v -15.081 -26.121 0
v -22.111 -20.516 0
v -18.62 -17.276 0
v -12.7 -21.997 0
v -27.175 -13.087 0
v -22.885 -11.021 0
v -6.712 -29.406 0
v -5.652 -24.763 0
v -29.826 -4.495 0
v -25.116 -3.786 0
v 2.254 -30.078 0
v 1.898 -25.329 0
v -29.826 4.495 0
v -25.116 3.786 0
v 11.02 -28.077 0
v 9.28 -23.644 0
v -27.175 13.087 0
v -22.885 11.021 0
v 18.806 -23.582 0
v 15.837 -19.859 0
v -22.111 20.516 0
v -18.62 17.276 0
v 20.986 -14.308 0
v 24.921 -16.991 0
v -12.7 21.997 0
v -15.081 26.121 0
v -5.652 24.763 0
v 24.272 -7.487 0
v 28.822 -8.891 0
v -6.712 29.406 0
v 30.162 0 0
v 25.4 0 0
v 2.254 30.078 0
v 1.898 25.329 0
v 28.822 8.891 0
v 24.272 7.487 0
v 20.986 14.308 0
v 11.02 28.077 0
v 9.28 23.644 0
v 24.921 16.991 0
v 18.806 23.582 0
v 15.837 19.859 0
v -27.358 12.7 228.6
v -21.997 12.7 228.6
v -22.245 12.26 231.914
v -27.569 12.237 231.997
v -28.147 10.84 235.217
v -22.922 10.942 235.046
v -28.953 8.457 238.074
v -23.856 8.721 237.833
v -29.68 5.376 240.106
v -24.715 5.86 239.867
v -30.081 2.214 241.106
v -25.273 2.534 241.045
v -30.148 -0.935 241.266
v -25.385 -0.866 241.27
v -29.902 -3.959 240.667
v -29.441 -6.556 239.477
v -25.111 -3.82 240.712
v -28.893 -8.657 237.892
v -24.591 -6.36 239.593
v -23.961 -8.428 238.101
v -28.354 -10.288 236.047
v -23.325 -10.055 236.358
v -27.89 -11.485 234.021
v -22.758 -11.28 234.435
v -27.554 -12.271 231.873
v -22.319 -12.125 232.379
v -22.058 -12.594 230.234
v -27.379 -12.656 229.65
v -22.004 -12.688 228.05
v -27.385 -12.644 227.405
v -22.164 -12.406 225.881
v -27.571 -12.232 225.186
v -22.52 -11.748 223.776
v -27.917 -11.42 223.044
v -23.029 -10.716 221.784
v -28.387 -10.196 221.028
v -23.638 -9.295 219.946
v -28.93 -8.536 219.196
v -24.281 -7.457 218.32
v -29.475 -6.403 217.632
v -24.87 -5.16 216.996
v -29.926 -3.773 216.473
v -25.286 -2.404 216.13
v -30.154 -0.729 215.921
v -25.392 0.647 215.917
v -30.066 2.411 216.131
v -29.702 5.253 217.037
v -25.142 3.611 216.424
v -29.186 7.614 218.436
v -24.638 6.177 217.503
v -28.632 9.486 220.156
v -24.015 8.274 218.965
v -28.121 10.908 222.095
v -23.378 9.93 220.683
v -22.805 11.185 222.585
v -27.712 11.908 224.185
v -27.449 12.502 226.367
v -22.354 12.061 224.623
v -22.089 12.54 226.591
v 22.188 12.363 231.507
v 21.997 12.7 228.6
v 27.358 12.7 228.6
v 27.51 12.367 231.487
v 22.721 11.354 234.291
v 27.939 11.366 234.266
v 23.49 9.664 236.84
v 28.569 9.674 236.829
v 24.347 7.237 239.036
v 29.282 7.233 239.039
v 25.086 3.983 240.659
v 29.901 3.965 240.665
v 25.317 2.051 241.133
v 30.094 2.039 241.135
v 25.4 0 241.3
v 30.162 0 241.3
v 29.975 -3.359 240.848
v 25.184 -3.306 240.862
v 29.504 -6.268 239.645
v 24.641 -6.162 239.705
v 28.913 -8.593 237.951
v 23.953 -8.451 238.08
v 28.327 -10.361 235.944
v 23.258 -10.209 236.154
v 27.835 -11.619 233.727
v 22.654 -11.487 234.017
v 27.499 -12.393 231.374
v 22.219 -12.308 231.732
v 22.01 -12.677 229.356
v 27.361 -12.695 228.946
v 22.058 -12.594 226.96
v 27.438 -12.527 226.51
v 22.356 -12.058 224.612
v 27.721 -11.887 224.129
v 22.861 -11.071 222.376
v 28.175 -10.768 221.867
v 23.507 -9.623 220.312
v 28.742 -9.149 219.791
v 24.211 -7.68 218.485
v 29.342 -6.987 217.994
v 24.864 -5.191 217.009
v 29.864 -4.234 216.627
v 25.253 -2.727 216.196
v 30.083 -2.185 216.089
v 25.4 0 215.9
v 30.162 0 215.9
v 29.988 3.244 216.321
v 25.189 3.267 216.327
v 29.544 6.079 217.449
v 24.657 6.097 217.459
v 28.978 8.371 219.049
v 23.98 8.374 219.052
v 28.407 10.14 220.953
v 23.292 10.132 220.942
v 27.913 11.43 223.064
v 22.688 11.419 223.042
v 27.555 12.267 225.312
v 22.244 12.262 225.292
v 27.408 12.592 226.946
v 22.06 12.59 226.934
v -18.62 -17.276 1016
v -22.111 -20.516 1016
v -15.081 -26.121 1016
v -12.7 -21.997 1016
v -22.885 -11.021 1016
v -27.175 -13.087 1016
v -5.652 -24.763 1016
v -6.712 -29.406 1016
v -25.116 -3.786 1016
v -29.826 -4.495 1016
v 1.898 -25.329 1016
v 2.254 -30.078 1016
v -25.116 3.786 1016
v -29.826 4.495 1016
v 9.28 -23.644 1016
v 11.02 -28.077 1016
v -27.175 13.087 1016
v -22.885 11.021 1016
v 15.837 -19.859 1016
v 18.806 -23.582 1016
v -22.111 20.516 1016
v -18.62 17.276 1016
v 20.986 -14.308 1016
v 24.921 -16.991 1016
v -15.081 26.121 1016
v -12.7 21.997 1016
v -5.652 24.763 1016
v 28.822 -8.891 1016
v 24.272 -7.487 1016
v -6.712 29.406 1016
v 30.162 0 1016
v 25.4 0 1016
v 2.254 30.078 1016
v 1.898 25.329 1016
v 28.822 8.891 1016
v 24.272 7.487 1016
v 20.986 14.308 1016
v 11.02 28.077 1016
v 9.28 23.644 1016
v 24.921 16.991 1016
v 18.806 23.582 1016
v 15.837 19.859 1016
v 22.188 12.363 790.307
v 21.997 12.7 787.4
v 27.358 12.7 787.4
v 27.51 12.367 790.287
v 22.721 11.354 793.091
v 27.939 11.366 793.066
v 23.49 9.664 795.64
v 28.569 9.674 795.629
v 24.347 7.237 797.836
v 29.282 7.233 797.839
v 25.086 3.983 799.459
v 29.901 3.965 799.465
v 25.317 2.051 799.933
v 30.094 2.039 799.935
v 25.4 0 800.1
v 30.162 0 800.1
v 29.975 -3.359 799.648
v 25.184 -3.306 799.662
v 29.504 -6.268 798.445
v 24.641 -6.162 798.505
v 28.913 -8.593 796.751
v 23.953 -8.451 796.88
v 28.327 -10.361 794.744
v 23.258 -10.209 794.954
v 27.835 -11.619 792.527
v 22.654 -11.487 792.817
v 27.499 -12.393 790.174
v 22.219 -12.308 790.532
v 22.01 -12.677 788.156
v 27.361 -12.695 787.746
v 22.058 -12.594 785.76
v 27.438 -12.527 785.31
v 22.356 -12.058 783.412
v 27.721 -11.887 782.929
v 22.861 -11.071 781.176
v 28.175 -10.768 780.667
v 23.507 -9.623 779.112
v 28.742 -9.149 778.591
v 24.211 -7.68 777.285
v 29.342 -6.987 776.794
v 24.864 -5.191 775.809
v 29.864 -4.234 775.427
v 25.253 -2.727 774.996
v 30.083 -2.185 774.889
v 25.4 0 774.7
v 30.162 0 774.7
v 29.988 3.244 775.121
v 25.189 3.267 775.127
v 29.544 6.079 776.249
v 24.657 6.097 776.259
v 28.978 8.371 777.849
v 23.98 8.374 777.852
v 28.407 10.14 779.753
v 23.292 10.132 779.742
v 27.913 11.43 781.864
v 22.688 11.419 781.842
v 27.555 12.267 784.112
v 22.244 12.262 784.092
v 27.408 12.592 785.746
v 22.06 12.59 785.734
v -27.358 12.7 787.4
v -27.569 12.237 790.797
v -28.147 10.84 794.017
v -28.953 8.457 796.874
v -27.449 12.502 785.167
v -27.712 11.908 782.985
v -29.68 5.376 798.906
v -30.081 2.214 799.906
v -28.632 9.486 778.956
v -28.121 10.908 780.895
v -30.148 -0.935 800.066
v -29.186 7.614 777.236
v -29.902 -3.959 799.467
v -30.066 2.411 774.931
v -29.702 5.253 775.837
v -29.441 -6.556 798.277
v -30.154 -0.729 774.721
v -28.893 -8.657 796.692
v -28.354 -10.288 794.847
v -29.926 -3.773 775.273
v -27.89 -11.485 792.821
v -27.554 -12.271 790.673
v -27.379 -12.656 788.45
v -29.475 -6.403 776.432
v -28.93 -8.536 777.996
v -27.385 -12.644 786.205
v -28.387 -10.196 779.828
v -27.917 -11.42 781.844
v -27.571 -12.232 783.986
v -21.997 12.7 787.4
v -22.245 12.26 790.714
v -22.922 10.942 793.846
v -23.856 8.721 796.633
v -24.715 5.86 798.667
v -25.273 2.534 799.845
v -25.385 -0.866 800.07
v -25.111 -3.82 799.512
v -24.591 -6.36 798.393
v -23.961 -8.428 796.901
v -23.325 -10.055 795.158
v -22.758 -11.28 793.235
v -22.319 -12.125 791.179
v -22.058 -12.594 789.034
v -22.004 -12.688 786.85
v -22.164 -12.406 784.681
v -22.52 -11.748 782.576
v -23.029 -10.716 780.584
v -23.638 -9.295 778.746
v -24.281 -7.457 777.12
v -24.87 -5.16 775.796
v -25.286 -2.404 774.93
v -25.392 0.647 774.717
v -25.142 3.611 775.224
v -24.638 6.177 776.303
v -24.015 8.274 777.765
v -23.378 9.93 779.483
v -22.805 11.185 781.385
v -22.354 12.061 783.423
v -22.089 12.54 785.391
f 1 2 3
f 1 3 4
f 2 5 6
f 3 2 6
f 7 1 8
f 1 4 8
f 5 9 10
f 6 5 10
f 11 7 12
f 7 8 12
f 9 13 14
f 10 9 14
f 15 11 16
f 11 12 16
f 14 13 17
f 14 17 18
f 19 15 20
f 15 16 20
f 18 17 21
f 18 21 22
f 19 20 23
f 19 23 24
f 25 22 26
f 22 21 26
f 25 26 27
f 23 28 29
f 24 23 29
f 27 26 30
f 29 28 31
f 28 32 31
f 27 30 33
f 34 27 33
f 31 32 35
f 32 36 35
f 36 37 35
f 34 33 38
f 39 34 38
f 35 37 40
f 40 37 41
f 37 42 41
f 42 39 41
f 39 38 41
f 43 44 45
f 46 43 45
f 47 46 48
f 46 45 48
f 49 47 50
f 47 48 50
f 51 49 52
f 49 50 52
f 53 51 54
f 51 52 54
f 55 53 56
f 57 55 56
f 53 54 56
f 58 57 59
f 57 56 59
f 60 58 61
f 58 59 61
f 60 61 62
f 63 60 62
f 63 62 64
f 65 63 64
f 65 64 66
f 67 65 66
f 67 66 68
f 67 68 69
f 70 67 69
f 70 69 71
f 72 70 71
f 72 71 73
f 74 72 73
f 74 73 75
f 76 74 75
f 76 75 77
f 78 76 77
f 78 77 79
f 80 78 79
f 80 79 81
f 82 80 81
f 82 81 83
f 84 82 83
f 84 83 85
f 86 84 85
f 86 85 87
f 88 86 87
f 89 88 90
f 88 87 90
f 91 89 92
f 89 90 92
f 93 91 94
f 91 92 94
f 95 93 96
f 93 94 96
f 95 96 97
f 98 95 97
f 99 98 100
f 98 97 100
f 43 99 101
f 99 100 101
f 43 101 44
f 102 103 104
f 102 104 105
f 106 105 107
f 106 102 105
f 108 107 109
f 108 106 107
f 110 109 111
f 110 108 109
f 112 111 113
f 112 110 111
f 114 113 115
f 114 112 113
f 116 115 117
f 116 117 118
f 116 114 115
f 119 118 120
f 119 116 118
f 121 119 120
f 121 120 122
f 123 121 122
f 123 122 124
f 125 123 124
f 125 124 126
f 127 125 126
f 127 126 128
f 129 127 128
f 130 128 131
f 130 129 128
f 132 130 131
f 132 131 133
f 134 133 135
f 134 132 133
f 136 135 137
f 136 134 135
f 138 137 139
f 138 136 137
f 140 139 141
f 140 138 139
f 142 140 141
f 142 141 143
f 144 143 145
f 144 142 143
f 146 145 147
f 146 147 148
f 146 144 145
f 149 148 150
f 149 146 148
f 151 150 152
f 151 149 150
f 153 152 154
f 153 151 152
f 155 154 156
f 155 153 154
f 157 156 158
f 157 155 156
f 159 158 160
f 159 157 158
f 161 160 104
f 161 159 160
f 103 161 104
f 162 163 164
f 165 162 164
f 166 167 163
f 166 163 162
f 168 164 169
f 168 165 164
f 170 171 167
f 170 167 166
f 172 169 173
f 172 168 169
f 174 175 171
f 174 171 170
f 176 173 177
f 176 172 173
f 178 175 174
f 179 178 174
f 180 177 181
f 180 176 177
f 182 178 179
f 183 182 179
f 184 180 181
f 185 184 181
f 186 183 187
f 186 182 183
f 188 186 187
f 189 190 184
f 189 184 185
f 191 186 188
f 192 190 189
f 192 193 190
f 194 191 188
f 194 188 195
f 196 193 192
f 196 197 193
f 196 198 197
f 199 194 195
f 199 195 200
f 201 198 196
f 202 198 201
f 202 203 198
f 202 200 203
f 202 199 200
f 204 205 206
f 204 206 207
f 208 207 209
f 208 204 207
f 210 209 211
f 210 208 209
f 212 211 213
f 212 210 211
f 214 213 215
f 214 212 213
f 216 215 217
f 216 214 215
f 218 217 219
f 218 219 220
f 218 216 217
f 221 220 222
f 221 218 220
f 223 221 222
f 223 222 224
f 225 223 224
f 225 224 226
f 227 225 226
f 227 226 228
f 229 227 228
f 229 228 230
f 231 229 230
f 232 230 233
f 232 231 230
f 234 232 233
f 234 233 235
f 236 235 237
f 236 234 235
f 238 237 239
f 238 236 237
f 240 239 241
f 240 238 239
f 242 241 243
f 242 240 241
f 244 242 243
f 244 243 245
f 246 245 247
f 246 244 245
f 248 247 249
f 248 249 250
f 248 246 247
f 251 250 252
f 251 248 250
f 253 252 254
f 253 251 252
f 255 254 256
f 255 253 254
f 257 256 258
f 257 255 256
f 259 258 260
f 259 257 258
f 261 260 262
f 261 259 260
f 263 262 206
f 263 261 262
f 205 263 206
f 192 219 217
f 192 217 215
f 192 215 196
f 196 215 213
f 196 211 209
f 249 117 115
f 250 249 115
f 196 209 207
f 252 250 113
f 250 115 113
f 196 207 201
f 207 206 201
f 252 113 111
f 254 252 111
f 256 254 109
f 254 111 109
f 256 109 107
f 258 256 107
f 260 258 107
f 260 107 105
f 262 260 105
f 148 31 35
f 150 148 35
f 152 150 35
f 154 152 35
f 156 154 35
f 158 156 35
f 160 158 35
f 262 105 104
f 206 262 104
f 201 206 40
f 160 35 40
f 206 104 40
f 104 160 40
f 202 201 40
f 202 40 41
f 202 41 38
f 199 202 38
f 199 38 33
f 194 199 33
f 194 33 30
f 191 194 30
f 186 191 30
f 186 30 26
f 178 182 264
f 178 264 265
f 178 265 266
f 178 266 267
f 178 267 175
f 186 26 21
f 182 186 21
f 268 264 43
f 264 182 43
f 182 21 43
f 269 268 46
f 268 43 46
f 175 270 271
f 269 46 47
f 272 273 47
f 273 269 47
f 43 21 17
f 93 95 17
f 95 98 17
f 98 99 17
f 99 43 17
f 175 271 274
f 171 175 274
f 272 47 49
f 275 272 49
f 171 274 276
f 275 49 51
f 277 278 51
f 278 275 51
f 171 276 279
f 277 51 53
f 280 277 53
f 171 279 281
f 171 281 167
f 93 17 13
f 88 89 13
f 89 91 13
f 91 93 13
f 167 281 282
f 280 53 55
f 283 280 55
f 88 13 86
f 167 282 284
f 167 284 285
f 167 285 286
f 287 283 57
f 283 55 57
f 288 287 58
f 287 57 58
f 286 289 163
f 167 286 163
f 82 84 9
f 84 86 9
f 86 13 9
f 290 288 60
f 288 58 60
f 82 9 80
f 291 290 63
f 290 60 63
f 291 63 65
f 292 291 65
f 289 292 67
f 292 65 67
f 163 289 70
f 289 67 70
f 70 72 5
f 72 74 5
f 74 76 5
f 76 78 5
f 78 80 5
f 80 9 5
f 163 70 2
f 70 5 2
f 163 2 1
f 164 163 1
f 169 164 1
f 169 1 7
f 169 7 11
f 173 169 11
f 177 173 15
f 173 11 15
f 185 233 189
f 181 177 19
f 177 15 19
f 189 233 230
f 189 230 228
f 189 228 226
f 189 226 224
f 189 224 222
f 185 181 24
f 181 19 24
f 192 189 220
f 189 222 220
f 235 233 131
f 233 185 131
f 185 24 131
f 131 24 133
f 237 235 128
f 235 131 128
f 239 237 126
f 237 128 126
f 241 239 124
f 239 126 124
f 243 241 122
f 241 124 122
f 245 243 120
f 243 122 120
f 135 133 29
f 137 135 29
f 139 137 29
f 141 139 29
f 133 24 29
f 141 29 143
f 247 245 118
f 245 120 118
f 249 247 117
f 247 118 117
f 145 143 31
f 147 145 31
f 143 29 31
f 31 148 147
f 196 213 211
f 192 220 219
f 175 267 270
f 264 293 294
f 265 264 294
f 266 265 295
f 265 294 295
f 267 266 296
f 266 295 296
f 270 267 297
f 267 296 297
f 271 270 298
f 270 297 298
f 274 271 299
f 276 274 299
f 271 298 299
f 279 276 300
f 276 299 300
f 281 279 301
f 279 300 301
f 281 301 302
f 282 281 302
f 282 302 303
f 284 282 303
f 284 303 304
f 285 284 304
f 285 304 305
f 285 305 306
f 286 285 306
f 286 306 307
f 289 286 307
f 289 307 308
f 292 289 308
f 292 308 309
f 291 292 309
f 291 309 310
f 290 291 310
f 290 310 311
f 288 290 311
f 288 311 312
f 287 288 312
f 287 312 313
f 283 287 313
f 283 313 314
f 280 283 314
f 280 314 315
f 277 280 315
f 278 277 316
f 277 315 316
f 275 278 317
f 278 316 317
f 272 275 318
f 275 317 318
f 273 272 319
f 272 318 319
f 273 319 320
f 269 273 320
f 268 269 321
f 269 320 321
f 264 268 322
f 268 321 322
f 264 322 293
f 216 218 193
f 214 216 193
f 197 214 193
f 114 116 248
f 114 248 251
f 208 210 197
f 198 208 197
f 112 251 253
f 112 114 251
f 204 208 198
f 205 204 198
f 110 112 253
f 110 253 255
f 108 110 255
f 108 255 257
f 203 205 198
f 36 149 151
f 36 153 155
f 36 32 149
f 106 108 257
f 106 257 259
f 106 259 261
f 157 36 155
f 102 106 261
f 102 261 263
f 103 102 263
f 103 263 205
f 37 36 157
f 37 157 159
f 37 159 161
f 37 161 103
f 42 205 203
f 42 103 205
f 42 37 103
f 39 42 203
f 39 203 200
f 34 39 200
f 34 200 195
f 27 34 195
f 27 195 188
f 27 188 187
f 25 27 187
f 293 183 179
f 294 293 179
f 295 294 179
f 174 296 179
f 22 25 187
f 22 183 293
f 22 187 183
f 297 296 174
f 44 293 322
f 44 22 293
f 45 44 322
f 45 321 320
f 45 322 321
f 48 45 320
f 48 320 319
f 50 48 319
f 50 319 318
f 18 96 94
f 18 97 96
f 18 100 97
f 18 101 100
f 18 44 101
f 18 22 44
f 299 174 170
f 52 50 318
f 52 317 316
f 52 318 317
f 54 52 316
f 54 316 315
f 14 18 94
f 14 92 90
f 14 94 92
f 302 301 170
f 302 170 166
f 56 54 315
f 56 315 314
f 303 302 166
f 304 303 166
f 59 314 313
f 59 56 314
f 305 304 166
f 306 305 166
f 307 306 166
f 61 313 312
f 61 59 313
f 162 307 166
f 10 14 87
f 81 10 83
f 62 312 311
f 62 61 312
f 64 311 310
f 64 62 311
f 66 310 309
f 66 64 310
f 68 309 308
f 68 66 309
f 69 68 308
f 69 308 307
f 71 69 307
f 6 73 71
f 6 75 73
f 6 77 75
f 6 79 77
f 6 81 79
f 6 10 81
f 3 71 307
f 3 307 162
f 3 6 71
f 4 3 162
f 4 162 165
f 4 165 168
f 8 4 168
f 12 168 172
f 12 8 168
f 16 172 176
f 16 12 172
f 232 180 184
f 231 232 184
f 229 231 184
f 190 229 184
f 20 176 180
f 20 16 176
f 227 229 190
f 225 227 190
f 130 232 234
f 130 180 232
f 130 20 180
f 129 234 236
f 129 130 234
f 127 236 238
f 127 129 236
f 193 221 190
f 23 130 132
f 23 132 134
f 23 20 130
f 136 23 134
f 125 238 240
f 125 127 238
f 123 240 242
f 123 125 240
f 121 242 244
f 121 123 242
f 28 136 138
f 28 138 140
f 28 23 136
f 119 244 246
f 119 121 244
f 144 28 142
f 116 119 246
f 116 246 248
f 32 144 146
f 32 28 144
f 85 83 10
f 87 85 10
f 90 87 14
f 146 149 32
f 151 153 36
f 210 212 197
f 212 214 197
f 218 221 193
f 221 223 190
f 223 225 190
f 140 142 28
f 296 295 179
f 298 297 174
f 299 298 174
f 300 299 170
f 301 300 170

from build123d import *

# Parameters (mm, degrees)
F0_R          = 30.1625
F0_R_2        = 25.4
F1_DEPTH      = 1016
F2_R          = 12.7
F3_DEPTH      = 31.1625001
F3_DEPTH_BACK = 31.1625001


with BuildPart() as f1:
    # F0 (on Top) → F1 (new body)
    with BuildSketch(Plane.XY):
        Circle(F0_R)
        Circle(F0_R_2, mode=Mode.SUBTRACT)
    extrude(amount=F1_DEPTH)

    # F2 (on Right) → F3 (cut, two sides)
    with BuildSketch(Plane.YZ) as f3_sk:
        with Locations((0, 228.6)):
            Circle(F2_R)
        with Locations((0, 787.4)):
            Circle(F2_R)
    extrude(amount=F3_DEPTH, mode=Mode.SUBTRACT)
    extrude(f3_sk.sketch, amount=-F3_DEPTH_BACK, mode=Mode.SUBTRACT)


solid = f1.part
